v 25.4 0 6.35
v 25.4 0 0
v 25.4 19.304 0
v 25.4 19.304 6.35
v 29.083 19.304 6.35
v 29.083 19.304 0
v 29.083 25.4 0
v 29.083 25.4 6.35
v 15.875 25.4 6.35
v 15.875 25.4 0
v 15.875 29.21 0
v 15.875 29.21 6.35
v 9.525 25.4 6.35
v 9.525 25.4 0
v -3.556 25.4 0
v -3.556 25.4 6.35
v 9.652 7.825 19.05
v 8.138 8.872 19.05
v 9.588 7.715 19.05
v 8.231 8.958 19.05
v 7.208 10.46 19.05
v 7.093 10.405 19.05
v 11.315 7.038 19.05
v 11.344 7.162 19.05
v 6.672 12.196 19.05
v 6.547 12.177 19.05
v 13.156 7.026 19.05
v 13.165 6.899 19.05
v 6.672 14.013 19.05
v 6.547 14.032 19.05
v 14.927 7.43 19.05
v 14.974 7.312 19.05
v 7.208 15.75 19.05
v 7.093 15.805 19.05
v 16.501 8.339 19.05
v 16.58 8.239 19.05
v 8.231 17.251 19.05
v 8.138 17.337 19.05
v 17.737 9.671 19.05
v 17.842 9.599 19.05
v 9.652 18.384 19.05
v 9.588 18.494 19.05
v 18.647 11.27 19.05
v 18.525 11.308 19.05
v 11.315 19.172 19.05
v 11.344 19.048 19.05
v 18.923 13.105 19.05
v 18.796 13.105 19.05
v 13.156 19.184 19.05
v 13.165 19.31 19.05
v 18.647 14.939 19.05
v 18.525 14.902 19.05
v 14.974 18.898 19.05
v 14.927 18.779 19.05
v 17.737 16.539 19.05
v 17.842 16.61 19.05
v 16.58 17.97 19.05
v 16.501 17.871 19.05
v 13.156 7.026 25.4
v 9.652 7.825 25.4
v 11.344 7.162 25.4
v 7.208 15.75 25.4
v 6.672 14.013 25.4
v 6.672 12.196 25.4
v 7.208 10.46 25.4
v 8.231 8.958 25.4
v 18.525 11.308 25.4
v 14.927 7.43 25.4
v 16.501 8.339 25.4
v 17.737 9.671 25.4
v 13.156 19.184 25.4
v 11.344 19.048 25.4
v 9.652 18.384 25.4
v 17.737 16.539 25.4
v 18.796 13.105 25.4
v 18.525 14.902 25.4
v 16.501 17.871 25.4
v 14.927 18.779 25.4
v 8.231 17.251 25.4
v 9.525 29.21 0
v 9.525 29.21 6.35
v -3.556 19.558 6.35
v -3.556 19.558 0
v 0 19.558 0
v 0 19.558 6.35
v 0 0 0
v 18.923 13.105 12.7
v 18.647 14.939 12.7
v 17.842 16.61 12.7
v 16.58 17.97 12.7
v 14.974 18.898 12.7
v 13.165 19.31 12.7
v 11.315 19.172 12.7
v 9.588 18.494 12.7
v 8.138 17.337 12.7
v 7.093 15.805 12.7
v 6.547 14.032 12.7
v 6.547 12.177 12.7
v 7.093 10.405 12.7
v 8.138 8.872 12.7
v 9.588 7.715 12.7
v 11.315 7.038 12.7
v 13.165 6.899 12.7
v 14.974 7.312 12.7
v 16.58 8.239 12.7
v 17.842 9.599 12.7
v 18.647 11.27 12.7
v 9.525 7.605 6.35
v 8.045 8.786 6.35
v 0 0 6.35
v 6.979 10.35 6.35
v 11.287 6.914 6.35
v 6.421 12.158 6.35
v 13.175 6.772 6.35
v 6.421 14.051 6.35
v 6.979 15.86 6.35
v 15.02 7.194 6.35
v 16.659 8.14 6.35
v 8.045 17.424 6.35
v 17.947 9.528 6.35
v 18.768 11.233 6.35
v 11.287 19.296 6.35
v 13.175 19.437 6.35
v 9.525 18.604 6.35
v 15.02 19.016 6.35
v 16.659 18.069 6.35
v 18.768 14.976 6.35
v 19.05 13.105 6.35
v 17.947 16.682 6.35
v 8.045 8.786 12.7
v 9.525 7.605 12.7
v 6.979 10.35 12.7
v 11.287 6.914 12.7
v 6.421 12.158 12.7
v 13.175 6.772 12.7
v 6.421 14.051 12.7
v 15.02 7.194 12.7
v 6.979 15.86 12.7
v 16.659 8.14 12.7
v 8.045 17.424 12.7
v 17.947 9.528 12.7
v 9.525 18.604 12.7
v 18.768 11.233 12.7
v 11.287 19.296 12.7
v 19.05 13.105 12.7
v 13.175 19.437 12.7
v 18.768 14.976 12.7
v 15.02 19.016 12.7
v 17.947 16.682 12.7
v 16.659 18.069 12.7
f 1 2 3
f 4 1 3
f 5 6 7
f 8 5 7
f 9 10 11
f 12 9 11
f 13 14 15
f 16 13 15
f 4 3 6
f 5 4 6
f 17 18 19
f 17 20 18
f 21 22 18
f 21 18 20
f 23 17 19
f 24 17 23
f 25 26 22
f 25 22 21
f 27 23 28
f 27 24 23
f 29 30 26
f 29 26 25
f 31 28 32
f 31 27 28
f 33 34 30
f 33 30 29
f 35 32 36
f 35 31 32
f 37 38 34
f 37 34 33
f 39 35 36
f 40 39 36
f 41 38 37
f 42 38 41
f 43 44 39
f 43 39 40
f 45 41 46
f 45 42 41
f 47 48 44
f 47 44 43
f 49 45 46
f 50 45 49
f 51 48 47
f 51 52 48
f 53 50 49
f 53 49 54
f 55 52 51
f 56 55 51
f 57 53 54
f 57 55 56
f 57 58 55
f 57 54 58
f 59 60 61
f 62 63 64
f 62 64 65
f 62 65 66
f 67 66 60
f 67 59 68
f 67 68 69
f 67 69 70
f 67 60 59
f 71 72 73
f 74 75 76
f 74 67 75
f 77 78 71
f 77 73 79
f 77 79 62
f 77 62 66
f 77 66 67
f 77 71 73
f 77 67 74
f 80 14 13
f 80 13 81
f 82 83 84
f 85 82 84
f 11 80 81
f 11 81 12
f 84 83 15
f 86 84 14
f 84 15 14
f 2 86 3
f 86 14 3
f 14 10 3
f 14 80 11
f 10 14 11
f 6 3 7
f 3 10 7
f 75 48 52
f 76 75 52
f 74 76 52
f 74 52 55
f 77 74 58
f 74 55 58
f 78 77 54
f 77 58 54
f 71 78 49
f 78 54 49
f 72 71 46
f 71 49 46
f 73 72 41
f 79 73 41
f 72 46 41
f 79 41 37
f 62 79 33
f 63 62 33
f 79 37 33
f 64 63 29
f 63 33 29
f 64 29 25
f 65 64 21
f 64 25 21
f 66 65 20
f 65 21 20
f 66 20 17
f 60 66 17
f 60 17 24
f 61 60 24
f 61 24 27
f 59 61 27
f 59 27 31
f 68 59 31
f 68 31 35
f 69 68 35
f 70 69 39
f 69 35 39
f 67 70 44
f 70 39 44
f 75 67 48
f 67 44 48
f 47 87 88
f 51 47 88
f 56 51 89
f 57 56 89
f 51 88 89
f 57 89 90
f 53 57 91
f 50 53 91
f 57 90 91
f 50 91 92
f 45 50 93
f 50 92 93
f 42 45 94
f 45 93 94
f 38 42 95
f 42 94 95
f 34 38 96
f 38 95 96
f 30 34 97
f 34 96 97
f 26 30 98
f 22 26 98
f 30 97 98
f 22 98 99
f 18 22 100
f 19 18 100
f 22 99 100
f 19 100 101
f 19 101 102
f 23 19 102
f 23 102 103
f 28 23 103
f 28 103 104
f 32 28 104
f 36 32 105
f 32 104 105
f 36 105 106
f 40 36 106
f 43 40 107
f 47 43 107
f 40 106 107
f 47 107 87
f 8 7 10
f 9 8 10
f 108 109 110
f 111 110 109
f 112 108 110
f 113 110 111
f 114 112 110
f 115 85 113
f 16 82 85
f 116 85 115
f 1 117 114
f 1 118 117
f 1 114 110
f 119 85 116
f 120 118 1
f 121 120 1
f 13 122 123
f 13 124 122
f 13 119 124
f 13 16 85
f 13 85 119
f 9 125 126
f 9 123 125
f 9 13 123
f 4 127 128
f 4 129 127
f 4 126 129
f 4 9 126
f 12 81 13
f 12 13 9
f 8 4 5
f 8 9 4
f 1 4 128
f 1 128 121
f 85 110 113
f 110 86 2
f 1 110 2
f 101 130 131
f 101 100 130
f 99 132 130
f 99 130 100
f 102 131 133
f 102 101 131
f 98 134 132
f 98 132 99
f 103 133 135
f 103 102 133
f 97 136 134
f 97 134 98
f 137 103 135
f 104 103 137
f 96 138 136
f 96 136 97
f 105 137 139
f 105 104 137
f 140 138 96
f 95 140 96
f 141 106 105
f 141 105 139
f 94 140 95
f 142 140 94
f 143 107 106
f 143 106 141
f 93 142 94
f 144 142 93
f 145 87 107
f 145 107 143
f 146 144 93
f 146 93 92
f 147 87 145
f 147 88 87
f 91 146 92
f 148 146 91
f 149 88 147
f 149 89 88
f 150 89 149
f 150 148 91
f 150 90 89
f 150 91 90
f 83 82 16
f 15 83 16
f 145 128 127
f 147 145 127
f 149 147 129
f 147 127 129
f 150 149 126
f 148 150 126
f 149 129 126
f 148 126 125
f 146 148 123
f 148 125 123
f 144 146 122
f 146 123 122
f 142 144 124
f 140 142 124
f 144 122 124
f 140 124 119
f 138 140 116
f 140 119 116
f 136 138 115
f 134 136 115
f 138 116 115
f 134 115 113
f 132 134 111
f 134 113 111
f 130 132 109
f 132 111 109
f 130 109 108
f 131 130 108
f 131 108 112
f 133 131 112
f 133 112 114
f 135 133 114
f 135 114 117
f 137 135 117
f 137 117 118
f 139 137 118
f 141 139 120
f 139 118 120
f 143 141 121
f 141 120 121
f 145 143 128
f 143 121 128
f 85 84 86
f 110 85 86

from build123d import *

# Parameters (mm, degrees)
F0_W     = 3.556
F0_H     = 5.842
F0_W_2   = 3.683
F0_H_2   = 6.096
F0_W_3   = 6.35
F0_H_3   = 3.81
F1_DEPTH = 6.35
F2_R     = 6.35
F3_DEPTH = 6.35
F4_R     = 6.223
F5_DEPTH = 6.35
F6_R     = 6.096
F7_DEPTH = 6.35


with BuildPart() as f1:
    # F0 (on Top) → F1 (new body)
    with BuildSketch(Plane.XY):
        Polygon((0, 19.558), (0, 0), (25.4, 0), (25.4, 19.304), (25.4, 25.4), (15.875, 25.4), (9.525, 25.4), (0, 25.4), align=None)
        with Locations((-1.778, 22.479)):
            Rectangle(F0_W, F0_H)
        with Locations((27.2415, 22.352)):
            Rectangle(F0_W_2, F0_H_2)
        with Locations((12.7, 27.305)):
            Rectangle(F0_W_3, F0_H_3)
    extrude(amount=F1_DEPTH)

    # F2 (on face) → F3 (join)
    with BuildSketch(Plane.XY.offset(6.35)):
        with Locations((12.7, 13.10474)):
            Circle(F2_R)
    extrude(amount=F3_DEPTH)

    # F4 (on face) → F5 (join)
    with BuildSketch(Plane.XY.offset(12.7)):
        with Locations((12.7, 13.10474)):
            Circle(F4_R)
    extrude(amount=F5_DEPTH)

    # F6 (on face) → F7 (join)
    with BuildSketch(Plane.XY.offset(19.05)):
        with Locations((12.7, 13.10474)):
            Circle(F6_R)
    extrude(amount=F7_DEPTH)


solid = f1.part
